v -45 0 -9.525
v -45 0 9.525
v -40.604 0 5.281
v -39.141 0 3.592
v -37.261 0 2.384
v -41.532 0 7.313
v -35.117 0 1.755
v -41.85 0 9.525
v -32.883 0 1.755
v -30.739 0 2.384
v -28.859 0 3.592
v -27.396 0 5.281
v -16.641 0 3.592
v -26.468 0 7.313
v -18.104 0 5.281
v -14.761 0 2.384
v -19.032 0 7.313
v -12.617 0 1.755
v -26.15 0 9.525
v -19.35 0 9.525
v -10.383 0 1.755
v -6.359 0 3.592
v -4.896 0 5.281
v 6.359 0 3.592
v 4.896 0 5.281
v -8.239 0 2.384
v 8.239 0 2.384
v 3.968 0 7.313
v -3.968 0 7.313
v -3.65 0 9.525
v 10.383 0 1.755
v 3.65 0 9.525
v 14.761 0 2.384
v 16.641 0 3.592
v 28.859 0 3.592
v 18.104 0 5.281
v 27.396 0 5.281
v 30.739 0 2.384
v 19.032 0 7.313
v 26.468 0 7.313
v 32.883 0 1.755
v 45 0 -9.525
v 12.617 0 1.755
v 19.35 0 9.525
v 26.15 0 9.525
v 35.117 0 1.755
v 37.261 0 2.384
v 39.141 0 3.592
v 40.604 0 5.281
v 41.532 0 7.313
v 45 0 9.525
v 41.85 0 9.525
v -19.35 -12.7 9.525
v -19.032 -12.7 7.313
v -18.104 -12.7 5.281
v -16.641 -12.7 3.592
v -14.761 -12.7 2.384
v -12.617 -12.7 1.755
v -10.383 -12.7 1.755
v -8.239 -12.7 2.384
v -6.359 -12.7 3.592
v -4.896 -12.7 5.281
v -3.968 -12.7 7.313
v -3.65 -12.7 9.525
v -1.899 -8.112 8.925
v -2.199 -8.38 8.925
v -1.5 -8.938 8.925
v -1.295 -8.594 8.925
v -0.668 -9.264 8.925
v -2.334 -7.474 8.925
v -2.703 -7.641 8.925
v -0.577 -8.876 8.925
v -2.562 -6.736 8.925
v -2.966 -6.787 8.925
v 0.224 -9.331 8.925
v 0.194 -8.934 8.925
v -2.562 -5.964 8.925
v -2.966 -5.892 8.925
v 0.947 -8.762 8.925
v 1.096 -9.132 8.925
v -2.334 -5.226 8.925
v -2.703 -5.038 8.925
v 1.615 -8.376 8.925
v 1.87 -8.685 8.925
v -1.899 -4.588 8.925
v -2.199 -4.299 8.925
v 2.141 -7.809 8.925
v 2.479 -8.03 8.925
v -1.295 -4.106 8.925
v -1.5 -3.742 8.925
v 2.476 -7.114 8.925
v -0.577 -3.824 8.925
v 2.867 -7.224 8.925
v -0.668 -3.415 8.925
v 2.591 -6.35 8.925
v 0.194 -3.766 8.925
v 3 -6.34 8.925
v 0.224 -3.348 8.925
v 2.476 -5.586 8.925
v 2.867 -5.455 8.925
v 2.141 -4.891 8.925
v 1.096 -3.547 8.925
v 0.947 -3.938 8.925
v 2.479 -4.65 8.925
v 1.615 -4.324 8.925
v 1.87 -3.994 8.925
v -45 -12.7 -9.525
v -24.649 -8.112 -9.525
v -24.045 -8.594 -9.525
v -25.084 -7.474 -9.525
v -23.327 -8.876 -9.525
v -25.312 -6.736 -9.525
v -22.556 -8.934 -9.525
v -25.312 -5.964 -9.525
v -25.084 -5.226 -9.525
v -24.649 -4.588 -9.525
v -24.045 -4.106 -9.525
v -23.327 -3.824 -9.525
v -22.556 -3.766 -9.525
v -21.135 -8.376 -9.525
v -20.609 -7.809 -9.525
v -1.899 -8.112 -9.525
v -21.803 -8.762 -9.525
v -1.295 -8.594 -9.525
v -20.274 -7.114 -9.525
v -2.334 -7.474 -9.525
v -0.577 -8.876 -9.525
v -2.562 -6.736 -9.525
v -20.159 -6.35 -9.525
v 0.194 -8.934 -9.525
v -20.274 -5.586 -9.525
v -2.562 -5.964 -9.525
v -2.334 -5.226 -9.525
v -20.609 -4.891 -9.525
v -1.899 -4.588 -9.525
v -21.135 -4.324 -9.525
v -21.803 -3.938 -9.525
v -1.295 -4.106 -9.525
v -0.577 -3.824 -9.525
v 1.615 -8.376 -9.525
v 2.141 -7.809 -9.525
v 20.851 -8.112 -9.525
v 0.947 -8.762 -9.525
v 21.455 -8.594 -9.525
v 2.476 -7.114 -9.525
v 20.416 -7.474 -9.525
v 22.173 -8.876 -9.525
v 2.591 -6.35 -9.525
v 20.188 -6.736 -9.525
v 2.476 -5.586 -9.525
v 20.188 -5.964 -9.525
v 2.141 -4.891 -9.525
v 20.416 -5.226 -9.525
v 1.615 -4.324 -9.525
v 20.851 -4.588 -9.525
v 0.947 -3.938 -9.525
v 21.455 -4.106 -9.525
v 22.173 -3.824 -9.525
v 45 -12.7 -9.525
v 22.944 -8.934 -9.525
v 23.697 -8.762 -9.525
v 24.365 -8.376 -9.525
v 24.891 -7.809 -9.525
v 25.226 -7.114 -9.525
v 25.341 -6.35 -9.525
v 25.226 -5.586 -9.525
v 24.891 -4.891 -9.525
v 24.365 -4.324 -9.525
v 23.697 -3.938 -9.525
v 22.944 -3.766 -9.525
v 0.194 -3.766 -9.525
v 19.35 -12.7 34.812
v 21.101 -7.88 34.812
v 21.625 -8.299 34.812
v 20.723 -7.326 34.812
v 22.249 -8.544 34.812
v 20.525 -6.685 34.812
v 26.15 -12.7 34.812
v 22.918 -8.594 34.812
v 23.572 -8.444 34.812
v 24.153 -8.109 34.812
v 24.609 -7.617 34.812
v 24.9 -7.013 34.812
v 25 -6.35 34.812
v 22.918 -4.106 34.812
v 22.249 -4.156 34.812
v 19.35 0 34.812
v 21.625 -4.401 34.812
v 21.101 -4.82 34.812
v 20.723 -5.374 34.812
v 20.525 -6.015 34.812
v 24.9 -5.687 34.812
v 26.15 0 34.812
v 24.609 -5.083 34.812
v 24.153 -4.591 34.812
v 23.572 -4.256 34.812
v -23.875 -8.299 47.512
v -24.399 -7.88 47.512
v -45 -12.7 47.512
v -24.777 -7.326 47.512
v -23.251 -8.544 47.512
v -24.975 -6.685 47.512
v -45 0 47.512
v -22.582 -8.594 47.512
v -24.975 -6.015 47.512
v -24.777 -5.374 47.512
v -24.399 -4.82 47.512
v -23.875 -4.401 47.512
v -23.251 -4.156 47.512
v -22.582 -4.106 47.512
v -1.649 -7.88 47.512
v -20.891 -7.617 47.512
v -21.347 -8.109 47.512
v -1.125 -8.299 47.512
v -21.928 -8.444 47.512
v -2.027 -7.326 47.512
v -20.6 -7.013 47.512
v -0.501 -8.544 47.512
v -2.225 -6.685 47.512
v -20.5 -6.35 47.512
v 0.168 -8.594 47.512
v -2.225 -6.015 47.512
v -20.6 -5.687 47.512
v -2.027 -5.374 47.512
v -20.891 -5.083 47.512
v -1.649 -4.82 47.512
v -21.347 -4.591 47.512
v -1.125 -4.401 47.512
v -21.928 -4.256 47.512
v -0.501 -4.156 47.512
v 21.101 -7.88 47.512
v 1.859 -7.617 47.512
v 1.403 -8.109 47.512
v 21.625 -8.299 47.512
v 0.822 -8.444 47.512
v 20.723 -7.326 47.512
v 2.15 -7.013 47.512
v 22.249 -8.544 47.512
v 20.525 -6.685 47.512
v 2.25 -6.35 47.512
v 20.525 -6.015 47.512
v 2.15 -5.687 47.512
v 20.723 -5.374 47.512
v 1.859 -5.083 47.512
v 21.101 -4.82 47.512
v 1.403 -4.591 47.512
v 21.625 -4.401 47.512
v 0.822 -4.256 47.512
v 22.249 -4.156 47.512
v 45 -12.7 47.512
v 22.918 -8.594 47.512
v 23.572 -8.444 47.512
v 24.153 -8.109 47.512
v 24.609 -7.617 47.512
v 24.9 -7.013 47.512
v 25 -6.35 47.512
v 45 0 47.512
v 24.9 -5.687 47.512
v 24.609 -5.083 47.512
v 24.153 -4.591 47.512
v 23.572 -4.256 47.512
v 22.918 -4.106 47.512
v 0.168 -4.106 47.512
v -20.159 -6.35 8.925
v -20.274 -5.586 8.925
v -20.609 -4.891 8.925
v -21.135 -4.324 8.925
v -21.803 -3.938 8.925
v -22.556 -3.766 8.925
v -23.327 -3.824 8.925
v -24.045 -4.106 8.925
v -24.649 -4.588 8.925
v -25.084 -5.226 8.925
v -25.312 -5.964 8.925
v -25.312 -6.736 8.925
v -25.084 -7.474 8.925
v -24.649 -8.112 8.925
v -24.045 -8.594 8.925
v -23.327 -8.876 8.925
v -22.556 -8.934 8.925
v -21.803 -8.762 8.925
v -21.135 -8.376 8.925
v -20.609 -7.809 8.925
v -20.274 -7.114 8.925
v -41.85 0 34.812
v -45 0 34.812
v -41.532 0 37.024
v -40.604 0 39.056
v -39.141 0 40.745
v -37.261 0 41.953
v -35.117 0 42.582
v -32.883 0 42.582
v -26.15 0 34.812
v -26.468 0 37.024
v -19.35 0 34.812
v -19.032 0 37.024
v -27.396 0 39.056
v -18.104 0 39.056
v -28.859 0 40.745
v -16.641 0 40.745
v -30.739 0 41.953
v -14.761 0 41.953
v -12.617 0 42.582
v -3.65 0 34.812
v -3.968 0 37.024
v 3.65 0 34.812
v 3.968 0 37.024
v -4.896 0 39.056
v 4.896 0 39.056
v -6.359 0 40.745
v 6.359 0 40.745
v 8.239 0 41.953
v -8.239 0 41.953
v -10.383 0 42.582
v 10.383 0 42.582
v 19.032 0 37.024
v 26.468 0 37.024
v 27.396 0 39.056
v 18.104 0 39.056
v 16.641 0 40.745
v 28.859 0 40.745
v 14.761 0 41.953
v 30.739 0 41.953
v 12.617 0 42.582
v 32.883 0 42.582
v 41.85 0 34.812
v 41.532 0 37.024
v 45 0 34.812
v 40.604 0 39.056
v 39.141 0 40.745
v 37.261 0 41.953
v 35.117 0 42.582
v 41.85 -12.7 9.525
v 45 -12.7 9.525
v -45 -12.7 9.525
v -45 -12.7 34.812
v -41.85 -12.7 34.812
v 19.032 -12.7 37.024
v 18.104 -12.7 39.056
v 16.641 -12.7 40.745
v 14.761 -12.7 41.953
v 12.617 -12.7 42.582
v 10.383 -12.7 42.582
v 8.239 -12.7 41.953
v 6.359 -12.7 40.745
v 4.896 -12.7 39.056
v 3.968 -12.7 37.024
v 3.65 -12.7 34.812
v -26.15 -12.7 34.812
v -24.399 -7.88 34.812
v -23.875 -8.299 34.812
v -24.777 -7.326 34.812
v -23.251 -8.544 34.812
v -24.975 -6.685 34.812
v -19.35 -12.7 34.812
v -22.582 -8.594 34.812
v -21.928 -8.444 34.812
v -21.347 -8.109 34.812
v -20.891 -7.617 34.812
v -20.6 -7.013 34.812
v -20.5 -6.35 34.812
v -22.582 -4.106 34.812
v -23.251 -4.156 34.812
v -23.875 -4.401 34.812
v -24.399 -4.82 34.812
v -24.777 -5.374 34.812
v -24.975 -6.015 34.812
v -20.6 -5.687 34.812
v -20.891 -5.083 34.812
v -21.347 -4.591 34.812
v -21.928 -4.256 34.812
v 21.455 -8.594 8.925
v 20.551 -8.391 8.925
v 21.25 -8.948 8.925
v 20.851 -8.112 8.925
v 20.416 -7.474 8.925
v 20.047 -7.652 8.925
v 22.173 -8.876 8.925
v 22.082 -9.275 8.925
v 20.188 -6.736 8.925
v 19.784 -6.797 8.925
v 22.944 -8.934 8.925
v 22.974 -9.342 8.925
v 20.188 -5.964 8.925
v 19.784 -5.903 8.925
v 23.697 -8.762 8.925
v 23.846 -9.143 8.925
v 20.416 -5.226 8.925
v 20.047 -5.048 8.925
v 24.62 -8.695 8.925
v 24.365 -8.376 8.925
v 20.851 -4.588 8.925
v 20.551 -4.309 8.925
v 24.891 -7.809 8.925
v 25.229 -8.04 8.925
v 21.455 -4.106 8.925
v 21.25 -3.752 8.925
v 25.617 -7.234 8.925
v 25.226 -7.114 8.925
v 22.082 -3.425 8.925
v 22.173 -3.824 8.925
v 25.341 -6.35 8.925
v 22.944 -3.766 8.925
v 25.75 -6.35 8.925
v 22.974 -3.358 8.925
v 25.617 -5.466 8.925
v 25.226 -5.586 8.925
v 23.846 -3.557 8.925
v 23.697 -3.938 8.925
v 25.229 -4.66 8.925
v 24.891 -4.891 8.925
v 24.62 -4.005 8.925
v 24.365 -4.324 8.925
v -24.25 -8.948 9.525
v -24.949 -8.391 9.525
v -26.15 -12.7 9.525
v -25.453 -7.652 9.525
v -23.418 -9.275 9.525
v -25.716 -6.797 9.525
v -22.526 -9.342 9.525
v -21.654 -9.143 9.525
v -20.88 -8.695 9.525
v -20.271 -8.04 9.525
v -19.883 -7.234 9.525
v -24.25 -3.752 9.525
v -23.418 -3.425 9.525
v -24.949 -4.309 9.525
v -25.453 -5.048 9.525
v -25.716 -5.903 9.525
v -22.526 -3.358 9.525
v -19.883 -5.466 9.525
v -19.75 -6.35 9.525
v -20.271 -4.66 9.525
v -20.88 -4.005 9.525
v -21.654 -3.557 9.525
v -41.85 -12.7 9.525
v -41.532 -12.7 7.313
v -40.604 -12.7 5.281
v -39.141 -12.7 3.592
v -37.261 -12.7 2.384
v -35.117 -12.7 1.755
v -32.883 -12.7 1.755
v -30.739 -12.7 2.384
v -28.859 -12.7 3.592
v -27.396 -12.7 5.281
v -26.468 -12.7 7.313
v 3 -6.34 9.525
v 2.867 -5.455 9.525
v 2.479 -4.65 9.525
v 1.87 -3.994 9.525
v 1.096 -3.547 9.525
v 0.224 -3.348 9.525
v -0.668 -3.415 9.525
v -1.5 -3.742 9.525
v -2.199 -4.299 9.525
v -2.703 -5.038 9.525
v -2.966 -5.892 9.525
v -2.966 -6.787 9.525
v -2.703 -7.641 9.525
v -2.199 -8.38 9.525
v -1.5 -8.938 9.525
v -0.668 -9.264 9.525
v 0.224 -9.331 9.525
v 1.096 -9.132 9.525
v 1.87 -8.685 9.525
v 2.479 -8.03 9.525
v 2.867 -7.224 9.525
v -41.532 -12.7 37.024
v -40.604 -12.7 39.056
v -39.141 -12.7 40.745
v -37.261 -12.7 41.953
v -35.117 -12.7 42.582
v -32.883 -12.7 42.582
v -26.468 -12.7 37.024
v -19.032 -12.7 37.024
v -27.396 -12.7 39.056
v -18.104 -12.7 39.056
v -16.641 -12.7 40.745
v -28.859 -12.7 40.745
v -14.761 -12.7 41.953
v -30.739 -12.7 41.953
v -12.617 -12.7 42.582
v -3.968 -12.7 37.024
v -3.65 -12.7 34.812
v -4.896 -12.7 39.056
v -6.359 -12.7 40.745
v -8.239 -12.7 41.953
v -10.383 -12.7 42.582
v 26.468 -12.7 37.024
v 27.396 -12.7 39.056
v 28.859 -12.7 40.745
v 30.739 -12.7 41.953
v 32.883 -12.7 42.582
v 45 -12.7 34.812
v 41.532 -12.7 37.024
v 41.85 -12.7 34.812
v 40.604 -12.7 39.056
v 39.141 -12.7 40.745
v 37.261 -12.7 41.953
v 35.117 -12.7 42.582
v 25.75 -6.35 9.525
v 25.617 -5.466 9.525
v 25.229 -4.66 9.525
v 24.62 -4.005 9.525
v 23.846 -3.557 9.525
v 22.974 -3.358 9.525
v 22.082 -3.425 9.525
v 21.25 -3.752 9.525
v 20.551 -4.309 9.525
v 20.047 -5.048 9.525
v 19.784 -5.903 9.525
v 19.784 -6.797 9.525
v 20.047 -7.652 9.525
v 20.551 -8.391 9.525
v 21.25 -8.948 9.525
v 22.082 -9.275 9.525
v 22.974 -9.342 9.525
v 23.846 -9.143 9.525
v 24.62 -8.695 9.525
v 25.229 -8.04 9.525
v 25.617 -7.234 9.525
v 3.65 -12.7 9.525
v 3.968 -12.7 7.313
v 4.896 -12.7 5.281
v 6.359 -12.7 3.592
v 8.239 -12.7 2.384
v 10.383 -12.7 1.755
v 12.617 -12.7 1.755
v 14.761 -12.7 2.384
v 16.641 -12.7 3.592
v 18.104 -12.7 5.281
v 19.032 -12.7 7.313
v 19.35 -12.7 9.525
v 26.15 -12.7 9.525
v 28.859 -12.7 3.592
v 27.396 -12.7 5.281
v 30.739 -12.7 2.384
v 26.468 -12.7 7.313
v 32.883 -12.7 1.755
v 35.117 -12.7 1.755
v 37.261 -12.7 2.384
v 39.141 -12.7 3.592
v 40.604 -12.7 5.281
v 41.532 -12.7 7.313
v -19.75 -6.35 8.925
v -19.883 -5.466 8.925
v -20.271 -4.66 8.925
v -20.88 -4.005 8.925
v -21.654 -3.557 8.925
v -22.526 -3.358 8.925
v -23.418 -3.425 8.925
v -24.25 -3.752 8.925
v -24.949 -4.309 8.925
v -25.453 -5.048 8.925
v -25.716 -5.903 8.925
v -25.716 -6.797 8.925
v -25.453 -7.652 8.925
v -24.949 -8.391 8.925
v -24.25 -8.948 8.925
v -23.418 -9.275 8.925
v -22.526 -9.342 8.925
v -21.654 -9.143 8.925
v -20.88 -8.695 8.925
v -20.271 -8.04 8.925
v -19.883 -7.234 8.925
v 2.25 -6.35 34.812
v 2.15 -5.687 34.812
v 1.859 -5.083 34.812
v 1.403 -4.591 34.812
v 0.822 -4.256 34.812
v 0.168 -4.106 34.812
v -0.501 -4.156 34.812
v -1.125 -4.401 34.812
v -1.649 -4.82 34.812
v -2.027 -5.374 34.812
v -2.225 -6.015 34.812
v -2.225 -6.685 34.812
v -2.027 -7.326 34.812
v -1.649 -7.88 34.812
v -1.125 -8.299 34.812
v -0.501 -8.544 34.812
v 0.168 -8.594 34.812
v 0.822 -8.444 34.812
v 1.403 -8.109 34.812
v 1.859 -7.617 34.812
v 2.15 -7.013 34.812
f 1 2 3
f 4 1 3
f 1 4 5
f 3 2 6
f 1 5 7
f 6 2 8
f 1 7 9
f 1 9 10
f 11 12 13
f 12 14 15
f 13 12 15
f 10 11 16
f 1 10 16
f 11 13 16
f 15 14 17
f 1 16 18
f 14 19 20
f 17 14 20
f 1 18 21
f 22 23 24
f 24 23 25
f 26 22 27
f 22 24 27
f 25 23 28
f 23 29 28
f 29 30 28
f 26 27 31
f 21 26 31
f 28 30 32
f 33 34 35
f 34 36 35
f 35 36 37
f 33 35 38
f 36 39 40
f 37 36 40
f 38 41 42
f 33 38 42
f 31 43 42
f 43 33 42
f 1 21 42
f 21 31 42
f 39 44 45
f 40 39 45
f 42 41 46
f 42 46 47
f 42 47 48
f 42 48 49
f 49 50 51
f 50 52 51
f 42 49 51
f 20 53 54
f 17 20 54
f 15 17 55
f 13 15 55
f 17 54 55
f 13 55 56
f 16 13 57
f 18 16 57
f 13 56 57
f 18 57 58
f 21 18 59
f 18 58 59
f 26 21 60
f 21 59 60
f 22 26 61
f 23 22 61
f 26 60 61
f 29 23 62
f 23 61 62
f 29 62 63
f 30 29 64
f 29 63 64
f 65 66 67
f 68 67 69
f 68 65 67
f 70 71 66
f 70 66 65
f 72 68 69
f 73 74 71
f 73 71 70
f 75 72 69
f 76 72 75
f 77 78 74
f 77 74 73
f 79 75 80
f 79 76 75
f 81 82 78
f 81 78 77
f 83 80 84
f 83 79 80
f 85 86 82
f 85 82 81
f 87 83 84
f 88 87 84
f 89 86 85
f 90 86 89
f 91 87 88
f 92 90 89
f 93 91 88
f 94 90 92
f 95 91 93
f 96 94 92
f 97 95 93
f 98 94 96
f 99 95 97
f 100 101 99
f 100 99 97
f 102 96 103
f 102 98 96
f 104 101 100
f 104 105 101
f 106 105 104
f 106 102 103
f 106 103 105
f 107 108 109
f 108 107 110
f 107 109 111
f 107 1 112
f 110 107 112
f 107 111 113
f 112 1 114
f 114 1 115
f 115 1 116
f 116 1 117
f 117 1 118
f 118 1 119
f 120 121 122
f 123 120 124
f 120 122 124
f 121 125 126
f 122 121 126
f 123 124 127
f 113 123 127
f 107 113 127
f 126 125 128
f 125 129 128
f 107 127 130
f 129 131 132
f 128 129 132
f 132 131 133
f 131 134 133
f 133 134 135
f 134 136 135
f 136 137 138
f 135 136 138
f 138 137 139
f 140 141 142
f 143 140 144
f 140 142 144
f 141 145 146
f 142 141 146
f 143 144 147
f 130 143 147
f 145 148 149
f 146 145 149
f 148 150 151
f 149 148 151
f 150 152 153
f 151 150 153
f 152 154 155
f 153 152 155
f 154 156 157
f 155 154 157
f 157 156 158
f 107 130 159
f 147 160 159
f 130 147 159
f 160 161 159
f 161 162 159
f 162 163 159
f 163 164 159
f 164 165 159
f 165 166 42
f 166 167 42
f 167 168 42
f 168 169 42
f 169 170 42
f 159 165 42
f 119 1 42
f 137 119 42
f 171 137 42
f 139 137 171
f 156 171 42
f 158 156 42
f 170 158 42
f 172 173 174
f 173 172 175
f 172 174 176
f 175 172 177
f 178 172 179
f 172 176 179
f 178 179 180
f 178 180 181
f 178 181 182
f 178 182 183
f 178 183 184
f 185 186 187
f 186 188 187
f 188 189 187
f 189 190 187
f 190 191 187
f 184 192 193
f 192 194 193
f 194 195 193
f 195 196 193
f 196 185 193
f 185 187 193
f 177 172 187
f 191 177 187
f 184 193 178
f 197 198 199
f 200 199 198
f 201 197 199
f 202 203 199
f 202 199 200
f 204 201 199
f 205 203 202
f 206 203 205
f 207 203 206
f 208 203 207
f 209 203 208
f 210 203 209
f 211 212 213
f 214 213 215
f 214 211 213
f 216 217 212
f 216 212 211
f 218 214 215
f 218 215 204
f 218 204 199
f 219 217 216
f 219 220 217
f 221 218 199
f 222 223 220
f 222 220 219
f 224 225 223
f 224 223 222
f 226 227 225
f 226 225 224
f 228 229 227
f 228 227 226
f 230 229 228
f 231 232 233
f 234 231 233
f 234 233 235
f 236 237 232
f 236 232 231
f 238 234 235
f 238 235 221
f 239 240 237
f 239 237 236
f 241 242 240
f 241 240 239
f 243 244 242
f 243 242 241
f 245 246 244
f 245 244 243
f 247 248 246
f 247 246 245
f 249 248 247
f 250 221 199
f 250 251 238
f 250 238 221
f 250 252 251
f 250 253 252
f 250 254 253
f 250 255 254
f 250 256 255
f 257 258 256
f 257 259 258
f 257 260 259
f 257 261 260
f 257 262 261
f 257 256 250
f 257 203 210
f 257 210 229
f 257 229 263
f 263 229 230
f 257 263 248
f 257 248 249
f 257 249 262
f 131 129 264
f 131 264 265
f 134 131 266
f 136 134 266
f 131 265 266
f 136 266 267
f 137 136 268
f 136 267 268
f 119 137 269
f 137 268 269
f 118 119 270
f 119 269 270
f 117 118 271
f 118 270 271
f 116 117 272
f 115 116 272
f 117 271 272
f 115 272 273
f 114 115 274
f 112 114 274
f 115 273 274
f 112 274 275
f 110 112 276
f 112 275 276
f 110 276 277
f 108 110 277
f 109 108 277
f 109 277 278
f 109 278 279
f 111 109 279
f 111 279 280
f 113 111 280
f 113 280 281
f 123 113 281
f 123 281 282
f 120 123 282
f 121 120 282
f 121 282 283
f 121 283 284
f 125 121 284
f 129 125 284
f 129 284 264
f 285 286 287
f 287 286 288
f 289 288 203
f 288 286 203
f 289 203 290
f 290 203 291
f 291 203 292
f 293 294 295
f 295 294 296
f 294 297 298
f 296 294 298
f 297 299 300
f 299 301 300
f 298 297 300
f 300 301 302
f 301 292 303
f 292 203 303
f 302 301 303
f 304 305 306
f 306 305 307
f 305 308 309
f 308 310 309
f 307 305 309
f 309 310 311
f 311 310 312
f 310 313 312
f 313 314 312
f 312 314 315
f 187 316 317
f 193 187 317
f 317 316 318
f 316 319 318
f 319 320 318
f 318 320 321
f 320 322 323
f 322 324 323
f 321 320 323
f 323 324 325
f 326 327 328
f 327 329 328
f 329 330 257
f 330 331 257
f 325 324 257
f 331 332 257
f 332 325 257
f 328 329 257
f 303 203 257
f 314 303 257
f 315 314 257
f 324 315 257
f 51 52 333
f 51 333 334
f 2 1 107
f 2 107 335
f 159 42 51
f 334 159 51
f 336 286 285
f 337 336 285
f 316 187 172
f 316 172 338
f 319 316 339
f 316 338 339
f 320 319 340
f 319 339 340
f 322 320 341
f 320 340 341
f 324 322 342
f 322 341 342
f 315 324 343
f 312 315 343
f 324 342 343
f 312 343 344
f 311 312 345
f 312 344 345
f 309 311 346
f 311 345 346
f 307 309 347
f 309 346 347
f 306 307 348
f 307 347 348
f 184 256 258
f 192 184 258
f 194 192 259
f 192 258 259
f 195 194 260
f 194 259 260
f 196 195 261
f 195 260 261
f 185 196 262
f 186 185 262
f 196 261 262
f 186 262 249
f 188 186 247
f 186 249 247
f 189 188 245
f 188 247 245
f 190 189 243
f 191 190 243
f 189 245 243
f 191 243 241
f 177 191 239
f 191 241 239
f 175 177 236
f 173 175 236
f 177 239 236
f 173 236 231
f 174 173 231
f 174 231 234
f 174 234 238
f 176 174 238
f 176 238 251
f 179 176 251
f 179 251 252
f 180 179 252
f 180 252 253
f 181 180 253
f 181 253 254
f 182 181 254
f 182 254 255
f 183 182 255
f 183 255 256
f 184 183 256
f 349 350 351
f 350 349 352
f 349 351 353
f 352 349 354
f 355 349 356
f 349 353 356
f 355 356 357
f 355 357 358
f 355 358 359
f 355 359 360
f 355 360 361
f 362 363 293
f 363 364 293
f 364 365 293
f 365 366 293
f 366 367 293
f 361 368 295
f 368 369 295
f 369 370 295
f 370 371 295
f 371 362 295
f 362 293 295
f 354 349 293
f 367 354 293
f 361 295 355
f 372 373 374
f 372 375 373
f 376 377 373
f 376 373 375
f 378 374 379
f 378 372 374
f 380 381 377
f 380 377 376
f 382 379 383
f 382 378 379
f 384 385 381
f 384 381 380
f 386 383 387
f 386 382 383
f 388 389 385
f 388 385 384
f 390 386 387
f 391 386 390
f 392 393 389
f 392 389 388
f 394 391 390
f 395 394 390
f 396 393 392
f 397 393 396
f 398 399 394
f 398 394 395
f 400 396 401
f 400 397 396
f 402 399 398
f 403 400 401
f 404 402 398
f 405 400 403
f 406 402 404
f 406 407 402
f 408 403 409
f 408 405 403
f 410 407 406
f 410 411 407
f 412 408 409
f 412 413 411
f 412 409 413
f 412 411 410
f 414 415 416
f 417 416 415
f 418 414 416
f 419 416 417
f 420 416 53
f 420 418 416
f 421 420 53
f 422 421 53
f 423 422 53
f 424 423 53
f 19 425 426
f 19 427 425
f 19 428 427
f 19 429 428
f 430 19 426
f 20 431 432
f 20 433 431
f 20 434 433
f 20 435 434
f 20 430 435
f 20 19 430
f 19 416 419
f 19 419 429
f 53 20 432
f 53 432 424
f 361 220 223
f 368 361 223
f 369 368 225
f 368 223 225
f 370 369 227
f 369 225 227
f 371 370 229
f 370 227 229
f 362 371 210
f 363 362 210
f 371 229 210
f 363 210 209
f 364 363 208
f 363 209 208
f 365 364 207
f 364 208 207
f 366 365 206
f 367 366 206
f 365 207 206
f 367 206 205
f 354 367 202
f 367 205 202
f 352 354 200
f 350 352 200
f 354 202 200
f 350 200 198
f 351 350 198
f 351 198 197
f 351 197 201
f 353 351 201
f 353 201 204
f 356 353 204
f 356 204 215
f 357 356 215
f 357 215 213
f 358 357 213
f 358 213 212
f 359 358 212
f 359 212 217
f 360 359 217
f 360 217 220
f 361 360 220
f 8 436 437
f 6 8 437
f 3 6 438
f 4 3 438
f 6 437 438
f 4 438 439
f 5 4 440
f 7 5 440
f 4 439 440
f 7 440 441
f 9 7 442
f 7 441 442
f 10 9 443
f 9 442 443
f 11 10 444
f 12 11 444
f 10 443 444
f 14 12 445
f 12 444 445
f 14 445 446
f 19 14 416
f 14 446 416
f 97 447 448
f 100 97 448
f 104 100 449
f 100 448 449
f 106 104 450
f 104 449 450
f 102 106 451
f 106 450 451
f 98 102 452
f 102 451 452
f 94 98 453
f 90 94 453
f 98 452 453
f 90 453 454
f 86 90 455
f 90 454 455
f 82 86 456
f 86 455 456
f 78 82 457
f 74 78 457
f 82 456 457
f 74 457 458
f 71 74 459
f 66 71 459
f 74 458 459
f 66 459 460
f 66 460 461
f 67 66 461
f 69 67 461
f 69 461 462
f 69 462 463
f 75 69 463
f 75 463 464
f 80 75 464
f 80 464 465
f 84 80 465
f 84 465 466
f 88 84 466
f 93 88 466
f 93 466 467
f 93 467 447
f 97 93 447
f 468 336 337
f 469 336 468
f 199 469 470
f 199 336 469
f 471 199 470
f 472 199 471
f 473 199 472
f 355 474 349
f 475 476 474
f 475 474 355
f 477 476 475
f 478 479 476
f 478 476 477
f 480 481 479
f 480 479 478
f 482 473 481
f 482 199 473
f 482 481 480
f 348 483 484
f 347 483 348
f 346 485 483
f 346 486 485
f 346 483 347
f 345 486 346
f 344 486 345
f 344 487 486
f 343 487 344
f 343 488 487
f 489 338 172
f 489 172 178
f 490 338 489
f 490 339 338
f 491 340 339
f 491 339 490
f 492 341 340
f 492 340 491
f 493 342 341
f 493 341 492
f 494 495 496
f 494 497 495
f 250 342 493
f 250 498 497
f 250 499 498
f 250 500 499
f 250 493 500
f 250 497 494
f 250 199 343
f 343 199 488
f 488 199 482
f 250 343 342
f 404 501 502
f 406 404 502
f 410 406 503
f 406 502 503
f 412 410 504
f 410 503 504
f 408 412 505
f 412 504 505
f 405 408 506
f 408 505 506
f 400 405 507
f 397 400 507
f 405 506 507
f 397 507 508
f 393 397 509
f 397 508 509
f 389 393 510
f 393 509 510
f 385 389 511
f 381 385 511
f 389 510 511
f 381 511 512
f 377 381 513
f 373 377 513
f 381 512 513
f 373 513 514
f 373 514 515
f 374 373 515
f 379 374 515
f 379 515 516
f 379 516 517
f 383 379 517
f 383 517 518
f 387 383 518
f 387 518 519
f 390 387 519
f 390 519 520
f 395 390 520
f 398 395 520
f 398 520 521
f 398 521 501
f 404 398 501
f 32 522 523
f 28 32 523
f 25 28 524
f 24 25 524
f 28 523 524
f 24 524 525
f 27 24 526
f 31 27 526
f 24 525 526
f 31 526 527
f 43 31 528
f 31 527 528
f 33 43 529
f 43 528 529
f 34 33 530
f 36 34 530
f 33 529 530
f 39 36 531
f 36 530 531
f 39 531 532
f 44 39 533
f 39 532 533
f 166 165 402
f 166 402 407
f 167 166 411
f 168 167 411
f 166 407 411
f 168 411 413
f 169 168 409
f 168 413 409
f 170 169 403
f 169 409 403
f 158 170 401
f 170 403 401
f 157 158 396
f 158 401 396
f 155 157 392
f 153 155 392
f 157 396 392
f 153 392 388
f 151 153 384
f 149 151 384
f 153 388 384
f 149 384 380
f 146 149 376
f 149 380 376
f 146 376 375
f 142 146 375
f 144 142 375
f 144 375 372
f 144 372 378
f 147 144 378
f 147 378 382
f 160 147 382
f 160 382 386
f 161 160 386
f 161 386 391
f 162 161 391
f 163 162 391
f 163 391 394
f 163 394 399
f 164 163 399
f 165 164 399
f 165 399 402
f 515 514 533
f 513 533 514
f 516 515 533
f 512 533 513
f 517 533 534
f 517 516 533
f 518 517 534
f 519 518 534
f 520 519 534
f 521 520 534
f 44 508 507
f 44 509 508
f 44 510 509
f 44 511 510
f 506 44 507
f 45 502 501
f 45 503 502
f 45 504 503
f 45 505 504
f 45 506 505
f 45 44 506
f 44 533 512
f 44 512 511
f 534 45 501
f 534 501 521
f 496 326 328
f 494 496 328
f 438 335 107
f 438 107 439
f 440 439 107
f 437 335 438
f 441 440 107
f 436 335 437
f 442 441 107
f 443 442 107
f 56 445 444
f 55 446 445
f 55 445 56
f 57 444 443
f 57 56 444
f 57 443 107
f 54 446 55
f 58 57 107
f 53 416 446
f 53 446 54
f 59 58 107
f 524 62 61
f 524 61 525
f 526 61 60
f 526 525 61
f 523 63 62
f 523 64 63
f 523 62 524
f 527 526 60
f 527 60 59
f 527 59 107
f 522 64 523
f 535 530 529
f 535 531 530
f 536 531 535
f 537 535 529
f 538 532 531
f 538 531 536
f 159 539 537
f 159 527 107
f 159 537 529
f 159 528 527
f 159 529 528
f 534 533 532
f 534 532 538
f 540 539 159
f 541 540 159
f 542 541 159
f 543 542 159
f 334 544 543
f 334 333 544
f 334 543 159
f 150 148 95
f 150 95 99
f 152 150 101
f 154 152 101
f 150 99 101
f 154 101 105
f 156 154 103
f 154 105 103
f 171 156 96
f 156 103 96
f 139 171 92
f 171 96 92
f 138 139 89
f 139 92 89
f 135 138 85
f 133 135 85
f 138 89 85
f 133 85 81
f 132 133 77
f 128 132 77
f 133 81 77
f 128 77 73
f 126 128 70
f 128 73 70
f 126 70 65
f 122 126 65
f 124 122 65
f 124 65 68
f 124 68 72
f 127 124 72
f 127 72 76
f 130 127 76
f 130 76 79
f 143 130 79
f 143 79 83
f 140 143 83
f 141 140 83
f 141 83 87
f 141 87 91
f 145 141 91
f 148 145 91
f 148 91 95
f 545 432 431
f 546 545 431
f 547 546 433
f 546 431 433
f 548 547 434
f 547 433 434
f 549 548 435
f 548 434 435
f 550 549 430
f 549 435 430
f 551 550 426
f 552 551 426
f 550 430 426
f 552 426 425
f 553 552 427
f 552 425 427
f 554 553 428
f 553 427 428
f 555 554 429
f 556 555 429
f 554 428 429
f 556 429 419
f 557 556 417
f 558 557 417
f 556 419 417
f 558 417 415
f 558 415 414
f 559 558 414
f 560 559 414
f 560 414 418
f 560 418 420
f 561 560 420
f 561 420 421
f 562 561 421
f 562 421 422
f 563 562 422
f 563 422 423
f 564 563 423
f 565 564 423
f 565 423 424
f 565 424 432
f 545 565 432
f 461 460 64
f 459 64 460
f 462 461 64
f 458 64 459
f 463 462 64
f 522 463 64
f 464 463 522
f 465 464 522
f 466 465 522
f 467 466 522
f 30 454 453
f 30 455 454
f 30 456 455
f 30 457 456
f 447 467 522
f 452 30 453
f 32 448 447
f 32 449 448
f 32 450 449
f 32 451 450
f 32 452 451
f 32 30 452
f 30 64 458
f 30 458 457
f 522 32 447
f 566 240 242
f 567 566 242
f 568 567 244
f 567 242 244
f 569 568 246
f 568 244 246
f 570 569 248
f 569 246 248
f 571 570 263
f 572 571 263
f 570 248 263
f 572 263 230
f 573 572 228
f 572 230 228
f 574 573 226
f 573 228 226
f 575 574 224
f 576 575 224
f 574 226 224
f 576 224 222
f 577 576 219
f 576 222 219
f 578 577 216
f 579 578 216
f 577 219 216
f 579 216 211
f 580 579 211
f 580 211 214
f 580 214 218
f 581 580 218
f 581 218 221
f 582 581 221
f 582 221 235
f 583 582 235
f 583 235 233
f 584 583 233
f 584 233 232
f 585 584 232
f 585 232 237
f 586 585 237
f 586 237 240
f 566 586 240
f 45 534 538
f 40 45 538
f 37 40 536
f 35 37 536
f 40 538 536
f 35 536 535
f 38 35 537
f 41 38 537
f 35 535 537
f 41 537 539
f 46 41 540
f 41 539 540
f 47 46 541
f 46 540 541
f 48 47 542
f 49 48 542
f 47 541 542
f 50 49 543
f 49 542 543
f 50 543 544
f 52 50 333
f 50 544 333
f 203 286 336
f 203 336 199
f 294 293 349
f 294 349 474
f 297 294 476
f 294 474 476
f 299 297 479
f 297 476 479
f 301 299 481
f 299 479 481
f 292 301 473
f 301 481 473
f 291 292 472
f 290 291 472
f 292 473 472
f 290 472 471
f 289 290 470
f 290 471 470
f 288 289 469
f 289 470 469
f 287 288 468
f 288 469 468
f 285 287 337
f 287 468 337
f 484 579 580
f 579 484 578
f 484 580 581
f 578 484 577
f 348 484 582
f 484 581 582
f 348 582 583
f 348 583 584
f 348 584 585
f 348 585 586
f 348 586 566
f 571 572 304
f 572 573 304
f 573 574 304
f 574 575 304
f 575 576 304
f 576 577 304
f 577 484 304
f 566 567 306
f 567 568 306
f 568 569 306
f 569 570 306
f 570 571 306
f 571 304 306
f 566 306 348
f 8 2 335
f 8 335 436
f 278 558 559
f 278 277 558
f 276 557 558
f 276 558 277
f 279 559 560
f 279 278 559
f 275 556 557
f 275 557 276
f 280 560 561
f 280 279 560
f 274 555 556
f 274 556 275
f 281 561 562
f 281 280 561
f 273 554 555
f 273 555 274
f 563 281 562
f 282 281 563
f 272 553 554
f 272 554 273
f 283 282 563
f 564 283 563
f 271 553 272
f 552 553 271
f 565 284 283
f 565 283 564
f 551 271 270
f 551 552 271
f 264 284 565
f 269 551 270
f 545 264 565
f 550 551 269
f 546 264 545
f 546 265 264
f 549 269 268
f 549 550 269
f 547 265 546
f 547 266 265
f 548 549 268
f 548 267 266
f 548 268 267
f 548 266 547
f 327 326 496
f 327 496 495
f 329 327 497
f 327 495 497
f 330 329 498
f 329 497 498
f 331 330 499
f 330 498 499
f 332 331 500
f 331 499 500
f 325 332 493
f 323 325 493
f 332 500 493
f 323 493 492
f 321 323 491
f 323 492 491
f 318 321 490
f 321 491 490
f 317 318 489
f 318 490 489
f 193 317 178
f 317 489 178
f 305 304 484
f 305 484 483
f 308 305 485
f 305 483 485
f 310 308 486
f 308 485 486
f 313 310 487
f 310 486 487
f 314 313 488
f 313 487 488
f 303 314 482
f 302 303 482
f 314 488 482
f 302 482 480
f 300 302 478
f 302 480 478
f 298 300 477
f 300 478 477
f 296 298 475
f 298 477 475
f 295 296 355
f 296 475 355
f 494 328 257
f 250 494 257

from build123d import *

# Parameters (mm, degrees)
F0_W      = 90
F0_H      = 19.05
F1_DEPTH  = 12.7
F2_R      = 7.85
F3_DEPTH  = 25.4
F4_W      = 90
F4_H      = 12.7
F5_DEPTH  = 12.7
F6_R      = 7.85
F7_DEPTH  = 25.4
F8_R      = 2.25
F9_DEPTH  = 25.4
F10_R     = 2.5908
F11_DEPTH = 20
F12_R     = 3
F13_DEPTH = 0.5
F14_DEPTH = 0.6


with BuildPart() as f1:
    # F0 (on Front) → F1 (new body)
    with BuildSketch(Plane.XZ):
        Rectangle(F0_W, F0_H)
    extrude(amount=F1_DEPTH)

    # F2 (on face) → F3 (cut)
    with BuildSketch(Plane.XZ.offset(12.7)):
        with Locations((-34, 9.525)):
            Circle(F2_R)
        with Locations((-11.5, 9.525)):
            Circle(F2_R)
        with Locations((11.5, 9.525)):
            Circle(F2_R)
        with Locations((34, 9.525)):
            Circle(F2_R)
    extrude(amount=-F3_DEPTH, mode=Mode.SUBTRACT)

    # F10 (on face) → F11 (cut)
    with BuildSketch(Plane.XY.offset(9.525)):
        with Locations((-22.75, -6.35)):
            Circle(F10_R)
        with Locations((0, -6.35)):
            Circle(F10_R)
        with Locations((22.75, -6.35)):
            Circle(F10_R)
    extrude(amount=-F11_DEPTH, mode=Mode.SUBTRACT)

    # F12 (on face) → F13 (cut)
    with BuildSketch(Plane.XY.offset(9.525)):
        with Locations((-22.75, -6.35)):
            Circle(F12_R)
        with Locations((22.75, -6.35)):
            Circle(F12_R)
        with Locations((0, -6.339623)):
            Circle(F12_R)
    extrude(amount=-F13_DEPTH, mode=Mode.SUBTRACT)

    # F12 (on face) → F14 (cut)
    with BuildSketch(Plane.XY.offset(9.525)):
        with Locations((-22.75, -6.35)):
            Circle(F12_R)
        with Locations((22.75, -6.35)):
            Circle(F12_R)
        with Locations((0, -6.339623)):
            Circle(F12_R)
    extrude(amount=-F14_DEPTH, mode=Mode.SUBTRACT)


with BuildPart() as f5:
    # F4 (on Front) → F5 (new body)
    with BuildSketch(Plane.XZ):
        with Locations((0, 41.162375)):
            Rectangle(F4_W, F4_H)
    extrude(amount=F5_DEPTH)

    # F6 (on face) → F7 (cut)
    with BuildSketch(Plane.XZ.offset(12.7)):
        with Locations((-34, 34.812375)):
            Circle(F6_R)
        with Locations((-11.5, 34.812375)):
            Circle(F6_R)
        with Locations((11.5, 34.812375)):
            Circle(F6_R)
        with Locations((34, 34.812375)):
            Circle(F6_R)
    extrude(amount=-F7_DEPTH, mode=Mode.SUBTRACT)

    # F8 (on face) → F9 (cut)
    with BuildSketch(Plane.XY.offset(47.512375)):
        with Locations((-22.75, -6.35)):
            Circle(F8_R)
        with Locations((0, -6.35)):
            Circle(F8_R)
        with Locations((22.75, -6.35)):
            Circle(F8_R)
    extrude(amount=-F9_DEPTH, mode=Mode.SUBTRACT)


solid = Compound([f1.part, f5.part])
